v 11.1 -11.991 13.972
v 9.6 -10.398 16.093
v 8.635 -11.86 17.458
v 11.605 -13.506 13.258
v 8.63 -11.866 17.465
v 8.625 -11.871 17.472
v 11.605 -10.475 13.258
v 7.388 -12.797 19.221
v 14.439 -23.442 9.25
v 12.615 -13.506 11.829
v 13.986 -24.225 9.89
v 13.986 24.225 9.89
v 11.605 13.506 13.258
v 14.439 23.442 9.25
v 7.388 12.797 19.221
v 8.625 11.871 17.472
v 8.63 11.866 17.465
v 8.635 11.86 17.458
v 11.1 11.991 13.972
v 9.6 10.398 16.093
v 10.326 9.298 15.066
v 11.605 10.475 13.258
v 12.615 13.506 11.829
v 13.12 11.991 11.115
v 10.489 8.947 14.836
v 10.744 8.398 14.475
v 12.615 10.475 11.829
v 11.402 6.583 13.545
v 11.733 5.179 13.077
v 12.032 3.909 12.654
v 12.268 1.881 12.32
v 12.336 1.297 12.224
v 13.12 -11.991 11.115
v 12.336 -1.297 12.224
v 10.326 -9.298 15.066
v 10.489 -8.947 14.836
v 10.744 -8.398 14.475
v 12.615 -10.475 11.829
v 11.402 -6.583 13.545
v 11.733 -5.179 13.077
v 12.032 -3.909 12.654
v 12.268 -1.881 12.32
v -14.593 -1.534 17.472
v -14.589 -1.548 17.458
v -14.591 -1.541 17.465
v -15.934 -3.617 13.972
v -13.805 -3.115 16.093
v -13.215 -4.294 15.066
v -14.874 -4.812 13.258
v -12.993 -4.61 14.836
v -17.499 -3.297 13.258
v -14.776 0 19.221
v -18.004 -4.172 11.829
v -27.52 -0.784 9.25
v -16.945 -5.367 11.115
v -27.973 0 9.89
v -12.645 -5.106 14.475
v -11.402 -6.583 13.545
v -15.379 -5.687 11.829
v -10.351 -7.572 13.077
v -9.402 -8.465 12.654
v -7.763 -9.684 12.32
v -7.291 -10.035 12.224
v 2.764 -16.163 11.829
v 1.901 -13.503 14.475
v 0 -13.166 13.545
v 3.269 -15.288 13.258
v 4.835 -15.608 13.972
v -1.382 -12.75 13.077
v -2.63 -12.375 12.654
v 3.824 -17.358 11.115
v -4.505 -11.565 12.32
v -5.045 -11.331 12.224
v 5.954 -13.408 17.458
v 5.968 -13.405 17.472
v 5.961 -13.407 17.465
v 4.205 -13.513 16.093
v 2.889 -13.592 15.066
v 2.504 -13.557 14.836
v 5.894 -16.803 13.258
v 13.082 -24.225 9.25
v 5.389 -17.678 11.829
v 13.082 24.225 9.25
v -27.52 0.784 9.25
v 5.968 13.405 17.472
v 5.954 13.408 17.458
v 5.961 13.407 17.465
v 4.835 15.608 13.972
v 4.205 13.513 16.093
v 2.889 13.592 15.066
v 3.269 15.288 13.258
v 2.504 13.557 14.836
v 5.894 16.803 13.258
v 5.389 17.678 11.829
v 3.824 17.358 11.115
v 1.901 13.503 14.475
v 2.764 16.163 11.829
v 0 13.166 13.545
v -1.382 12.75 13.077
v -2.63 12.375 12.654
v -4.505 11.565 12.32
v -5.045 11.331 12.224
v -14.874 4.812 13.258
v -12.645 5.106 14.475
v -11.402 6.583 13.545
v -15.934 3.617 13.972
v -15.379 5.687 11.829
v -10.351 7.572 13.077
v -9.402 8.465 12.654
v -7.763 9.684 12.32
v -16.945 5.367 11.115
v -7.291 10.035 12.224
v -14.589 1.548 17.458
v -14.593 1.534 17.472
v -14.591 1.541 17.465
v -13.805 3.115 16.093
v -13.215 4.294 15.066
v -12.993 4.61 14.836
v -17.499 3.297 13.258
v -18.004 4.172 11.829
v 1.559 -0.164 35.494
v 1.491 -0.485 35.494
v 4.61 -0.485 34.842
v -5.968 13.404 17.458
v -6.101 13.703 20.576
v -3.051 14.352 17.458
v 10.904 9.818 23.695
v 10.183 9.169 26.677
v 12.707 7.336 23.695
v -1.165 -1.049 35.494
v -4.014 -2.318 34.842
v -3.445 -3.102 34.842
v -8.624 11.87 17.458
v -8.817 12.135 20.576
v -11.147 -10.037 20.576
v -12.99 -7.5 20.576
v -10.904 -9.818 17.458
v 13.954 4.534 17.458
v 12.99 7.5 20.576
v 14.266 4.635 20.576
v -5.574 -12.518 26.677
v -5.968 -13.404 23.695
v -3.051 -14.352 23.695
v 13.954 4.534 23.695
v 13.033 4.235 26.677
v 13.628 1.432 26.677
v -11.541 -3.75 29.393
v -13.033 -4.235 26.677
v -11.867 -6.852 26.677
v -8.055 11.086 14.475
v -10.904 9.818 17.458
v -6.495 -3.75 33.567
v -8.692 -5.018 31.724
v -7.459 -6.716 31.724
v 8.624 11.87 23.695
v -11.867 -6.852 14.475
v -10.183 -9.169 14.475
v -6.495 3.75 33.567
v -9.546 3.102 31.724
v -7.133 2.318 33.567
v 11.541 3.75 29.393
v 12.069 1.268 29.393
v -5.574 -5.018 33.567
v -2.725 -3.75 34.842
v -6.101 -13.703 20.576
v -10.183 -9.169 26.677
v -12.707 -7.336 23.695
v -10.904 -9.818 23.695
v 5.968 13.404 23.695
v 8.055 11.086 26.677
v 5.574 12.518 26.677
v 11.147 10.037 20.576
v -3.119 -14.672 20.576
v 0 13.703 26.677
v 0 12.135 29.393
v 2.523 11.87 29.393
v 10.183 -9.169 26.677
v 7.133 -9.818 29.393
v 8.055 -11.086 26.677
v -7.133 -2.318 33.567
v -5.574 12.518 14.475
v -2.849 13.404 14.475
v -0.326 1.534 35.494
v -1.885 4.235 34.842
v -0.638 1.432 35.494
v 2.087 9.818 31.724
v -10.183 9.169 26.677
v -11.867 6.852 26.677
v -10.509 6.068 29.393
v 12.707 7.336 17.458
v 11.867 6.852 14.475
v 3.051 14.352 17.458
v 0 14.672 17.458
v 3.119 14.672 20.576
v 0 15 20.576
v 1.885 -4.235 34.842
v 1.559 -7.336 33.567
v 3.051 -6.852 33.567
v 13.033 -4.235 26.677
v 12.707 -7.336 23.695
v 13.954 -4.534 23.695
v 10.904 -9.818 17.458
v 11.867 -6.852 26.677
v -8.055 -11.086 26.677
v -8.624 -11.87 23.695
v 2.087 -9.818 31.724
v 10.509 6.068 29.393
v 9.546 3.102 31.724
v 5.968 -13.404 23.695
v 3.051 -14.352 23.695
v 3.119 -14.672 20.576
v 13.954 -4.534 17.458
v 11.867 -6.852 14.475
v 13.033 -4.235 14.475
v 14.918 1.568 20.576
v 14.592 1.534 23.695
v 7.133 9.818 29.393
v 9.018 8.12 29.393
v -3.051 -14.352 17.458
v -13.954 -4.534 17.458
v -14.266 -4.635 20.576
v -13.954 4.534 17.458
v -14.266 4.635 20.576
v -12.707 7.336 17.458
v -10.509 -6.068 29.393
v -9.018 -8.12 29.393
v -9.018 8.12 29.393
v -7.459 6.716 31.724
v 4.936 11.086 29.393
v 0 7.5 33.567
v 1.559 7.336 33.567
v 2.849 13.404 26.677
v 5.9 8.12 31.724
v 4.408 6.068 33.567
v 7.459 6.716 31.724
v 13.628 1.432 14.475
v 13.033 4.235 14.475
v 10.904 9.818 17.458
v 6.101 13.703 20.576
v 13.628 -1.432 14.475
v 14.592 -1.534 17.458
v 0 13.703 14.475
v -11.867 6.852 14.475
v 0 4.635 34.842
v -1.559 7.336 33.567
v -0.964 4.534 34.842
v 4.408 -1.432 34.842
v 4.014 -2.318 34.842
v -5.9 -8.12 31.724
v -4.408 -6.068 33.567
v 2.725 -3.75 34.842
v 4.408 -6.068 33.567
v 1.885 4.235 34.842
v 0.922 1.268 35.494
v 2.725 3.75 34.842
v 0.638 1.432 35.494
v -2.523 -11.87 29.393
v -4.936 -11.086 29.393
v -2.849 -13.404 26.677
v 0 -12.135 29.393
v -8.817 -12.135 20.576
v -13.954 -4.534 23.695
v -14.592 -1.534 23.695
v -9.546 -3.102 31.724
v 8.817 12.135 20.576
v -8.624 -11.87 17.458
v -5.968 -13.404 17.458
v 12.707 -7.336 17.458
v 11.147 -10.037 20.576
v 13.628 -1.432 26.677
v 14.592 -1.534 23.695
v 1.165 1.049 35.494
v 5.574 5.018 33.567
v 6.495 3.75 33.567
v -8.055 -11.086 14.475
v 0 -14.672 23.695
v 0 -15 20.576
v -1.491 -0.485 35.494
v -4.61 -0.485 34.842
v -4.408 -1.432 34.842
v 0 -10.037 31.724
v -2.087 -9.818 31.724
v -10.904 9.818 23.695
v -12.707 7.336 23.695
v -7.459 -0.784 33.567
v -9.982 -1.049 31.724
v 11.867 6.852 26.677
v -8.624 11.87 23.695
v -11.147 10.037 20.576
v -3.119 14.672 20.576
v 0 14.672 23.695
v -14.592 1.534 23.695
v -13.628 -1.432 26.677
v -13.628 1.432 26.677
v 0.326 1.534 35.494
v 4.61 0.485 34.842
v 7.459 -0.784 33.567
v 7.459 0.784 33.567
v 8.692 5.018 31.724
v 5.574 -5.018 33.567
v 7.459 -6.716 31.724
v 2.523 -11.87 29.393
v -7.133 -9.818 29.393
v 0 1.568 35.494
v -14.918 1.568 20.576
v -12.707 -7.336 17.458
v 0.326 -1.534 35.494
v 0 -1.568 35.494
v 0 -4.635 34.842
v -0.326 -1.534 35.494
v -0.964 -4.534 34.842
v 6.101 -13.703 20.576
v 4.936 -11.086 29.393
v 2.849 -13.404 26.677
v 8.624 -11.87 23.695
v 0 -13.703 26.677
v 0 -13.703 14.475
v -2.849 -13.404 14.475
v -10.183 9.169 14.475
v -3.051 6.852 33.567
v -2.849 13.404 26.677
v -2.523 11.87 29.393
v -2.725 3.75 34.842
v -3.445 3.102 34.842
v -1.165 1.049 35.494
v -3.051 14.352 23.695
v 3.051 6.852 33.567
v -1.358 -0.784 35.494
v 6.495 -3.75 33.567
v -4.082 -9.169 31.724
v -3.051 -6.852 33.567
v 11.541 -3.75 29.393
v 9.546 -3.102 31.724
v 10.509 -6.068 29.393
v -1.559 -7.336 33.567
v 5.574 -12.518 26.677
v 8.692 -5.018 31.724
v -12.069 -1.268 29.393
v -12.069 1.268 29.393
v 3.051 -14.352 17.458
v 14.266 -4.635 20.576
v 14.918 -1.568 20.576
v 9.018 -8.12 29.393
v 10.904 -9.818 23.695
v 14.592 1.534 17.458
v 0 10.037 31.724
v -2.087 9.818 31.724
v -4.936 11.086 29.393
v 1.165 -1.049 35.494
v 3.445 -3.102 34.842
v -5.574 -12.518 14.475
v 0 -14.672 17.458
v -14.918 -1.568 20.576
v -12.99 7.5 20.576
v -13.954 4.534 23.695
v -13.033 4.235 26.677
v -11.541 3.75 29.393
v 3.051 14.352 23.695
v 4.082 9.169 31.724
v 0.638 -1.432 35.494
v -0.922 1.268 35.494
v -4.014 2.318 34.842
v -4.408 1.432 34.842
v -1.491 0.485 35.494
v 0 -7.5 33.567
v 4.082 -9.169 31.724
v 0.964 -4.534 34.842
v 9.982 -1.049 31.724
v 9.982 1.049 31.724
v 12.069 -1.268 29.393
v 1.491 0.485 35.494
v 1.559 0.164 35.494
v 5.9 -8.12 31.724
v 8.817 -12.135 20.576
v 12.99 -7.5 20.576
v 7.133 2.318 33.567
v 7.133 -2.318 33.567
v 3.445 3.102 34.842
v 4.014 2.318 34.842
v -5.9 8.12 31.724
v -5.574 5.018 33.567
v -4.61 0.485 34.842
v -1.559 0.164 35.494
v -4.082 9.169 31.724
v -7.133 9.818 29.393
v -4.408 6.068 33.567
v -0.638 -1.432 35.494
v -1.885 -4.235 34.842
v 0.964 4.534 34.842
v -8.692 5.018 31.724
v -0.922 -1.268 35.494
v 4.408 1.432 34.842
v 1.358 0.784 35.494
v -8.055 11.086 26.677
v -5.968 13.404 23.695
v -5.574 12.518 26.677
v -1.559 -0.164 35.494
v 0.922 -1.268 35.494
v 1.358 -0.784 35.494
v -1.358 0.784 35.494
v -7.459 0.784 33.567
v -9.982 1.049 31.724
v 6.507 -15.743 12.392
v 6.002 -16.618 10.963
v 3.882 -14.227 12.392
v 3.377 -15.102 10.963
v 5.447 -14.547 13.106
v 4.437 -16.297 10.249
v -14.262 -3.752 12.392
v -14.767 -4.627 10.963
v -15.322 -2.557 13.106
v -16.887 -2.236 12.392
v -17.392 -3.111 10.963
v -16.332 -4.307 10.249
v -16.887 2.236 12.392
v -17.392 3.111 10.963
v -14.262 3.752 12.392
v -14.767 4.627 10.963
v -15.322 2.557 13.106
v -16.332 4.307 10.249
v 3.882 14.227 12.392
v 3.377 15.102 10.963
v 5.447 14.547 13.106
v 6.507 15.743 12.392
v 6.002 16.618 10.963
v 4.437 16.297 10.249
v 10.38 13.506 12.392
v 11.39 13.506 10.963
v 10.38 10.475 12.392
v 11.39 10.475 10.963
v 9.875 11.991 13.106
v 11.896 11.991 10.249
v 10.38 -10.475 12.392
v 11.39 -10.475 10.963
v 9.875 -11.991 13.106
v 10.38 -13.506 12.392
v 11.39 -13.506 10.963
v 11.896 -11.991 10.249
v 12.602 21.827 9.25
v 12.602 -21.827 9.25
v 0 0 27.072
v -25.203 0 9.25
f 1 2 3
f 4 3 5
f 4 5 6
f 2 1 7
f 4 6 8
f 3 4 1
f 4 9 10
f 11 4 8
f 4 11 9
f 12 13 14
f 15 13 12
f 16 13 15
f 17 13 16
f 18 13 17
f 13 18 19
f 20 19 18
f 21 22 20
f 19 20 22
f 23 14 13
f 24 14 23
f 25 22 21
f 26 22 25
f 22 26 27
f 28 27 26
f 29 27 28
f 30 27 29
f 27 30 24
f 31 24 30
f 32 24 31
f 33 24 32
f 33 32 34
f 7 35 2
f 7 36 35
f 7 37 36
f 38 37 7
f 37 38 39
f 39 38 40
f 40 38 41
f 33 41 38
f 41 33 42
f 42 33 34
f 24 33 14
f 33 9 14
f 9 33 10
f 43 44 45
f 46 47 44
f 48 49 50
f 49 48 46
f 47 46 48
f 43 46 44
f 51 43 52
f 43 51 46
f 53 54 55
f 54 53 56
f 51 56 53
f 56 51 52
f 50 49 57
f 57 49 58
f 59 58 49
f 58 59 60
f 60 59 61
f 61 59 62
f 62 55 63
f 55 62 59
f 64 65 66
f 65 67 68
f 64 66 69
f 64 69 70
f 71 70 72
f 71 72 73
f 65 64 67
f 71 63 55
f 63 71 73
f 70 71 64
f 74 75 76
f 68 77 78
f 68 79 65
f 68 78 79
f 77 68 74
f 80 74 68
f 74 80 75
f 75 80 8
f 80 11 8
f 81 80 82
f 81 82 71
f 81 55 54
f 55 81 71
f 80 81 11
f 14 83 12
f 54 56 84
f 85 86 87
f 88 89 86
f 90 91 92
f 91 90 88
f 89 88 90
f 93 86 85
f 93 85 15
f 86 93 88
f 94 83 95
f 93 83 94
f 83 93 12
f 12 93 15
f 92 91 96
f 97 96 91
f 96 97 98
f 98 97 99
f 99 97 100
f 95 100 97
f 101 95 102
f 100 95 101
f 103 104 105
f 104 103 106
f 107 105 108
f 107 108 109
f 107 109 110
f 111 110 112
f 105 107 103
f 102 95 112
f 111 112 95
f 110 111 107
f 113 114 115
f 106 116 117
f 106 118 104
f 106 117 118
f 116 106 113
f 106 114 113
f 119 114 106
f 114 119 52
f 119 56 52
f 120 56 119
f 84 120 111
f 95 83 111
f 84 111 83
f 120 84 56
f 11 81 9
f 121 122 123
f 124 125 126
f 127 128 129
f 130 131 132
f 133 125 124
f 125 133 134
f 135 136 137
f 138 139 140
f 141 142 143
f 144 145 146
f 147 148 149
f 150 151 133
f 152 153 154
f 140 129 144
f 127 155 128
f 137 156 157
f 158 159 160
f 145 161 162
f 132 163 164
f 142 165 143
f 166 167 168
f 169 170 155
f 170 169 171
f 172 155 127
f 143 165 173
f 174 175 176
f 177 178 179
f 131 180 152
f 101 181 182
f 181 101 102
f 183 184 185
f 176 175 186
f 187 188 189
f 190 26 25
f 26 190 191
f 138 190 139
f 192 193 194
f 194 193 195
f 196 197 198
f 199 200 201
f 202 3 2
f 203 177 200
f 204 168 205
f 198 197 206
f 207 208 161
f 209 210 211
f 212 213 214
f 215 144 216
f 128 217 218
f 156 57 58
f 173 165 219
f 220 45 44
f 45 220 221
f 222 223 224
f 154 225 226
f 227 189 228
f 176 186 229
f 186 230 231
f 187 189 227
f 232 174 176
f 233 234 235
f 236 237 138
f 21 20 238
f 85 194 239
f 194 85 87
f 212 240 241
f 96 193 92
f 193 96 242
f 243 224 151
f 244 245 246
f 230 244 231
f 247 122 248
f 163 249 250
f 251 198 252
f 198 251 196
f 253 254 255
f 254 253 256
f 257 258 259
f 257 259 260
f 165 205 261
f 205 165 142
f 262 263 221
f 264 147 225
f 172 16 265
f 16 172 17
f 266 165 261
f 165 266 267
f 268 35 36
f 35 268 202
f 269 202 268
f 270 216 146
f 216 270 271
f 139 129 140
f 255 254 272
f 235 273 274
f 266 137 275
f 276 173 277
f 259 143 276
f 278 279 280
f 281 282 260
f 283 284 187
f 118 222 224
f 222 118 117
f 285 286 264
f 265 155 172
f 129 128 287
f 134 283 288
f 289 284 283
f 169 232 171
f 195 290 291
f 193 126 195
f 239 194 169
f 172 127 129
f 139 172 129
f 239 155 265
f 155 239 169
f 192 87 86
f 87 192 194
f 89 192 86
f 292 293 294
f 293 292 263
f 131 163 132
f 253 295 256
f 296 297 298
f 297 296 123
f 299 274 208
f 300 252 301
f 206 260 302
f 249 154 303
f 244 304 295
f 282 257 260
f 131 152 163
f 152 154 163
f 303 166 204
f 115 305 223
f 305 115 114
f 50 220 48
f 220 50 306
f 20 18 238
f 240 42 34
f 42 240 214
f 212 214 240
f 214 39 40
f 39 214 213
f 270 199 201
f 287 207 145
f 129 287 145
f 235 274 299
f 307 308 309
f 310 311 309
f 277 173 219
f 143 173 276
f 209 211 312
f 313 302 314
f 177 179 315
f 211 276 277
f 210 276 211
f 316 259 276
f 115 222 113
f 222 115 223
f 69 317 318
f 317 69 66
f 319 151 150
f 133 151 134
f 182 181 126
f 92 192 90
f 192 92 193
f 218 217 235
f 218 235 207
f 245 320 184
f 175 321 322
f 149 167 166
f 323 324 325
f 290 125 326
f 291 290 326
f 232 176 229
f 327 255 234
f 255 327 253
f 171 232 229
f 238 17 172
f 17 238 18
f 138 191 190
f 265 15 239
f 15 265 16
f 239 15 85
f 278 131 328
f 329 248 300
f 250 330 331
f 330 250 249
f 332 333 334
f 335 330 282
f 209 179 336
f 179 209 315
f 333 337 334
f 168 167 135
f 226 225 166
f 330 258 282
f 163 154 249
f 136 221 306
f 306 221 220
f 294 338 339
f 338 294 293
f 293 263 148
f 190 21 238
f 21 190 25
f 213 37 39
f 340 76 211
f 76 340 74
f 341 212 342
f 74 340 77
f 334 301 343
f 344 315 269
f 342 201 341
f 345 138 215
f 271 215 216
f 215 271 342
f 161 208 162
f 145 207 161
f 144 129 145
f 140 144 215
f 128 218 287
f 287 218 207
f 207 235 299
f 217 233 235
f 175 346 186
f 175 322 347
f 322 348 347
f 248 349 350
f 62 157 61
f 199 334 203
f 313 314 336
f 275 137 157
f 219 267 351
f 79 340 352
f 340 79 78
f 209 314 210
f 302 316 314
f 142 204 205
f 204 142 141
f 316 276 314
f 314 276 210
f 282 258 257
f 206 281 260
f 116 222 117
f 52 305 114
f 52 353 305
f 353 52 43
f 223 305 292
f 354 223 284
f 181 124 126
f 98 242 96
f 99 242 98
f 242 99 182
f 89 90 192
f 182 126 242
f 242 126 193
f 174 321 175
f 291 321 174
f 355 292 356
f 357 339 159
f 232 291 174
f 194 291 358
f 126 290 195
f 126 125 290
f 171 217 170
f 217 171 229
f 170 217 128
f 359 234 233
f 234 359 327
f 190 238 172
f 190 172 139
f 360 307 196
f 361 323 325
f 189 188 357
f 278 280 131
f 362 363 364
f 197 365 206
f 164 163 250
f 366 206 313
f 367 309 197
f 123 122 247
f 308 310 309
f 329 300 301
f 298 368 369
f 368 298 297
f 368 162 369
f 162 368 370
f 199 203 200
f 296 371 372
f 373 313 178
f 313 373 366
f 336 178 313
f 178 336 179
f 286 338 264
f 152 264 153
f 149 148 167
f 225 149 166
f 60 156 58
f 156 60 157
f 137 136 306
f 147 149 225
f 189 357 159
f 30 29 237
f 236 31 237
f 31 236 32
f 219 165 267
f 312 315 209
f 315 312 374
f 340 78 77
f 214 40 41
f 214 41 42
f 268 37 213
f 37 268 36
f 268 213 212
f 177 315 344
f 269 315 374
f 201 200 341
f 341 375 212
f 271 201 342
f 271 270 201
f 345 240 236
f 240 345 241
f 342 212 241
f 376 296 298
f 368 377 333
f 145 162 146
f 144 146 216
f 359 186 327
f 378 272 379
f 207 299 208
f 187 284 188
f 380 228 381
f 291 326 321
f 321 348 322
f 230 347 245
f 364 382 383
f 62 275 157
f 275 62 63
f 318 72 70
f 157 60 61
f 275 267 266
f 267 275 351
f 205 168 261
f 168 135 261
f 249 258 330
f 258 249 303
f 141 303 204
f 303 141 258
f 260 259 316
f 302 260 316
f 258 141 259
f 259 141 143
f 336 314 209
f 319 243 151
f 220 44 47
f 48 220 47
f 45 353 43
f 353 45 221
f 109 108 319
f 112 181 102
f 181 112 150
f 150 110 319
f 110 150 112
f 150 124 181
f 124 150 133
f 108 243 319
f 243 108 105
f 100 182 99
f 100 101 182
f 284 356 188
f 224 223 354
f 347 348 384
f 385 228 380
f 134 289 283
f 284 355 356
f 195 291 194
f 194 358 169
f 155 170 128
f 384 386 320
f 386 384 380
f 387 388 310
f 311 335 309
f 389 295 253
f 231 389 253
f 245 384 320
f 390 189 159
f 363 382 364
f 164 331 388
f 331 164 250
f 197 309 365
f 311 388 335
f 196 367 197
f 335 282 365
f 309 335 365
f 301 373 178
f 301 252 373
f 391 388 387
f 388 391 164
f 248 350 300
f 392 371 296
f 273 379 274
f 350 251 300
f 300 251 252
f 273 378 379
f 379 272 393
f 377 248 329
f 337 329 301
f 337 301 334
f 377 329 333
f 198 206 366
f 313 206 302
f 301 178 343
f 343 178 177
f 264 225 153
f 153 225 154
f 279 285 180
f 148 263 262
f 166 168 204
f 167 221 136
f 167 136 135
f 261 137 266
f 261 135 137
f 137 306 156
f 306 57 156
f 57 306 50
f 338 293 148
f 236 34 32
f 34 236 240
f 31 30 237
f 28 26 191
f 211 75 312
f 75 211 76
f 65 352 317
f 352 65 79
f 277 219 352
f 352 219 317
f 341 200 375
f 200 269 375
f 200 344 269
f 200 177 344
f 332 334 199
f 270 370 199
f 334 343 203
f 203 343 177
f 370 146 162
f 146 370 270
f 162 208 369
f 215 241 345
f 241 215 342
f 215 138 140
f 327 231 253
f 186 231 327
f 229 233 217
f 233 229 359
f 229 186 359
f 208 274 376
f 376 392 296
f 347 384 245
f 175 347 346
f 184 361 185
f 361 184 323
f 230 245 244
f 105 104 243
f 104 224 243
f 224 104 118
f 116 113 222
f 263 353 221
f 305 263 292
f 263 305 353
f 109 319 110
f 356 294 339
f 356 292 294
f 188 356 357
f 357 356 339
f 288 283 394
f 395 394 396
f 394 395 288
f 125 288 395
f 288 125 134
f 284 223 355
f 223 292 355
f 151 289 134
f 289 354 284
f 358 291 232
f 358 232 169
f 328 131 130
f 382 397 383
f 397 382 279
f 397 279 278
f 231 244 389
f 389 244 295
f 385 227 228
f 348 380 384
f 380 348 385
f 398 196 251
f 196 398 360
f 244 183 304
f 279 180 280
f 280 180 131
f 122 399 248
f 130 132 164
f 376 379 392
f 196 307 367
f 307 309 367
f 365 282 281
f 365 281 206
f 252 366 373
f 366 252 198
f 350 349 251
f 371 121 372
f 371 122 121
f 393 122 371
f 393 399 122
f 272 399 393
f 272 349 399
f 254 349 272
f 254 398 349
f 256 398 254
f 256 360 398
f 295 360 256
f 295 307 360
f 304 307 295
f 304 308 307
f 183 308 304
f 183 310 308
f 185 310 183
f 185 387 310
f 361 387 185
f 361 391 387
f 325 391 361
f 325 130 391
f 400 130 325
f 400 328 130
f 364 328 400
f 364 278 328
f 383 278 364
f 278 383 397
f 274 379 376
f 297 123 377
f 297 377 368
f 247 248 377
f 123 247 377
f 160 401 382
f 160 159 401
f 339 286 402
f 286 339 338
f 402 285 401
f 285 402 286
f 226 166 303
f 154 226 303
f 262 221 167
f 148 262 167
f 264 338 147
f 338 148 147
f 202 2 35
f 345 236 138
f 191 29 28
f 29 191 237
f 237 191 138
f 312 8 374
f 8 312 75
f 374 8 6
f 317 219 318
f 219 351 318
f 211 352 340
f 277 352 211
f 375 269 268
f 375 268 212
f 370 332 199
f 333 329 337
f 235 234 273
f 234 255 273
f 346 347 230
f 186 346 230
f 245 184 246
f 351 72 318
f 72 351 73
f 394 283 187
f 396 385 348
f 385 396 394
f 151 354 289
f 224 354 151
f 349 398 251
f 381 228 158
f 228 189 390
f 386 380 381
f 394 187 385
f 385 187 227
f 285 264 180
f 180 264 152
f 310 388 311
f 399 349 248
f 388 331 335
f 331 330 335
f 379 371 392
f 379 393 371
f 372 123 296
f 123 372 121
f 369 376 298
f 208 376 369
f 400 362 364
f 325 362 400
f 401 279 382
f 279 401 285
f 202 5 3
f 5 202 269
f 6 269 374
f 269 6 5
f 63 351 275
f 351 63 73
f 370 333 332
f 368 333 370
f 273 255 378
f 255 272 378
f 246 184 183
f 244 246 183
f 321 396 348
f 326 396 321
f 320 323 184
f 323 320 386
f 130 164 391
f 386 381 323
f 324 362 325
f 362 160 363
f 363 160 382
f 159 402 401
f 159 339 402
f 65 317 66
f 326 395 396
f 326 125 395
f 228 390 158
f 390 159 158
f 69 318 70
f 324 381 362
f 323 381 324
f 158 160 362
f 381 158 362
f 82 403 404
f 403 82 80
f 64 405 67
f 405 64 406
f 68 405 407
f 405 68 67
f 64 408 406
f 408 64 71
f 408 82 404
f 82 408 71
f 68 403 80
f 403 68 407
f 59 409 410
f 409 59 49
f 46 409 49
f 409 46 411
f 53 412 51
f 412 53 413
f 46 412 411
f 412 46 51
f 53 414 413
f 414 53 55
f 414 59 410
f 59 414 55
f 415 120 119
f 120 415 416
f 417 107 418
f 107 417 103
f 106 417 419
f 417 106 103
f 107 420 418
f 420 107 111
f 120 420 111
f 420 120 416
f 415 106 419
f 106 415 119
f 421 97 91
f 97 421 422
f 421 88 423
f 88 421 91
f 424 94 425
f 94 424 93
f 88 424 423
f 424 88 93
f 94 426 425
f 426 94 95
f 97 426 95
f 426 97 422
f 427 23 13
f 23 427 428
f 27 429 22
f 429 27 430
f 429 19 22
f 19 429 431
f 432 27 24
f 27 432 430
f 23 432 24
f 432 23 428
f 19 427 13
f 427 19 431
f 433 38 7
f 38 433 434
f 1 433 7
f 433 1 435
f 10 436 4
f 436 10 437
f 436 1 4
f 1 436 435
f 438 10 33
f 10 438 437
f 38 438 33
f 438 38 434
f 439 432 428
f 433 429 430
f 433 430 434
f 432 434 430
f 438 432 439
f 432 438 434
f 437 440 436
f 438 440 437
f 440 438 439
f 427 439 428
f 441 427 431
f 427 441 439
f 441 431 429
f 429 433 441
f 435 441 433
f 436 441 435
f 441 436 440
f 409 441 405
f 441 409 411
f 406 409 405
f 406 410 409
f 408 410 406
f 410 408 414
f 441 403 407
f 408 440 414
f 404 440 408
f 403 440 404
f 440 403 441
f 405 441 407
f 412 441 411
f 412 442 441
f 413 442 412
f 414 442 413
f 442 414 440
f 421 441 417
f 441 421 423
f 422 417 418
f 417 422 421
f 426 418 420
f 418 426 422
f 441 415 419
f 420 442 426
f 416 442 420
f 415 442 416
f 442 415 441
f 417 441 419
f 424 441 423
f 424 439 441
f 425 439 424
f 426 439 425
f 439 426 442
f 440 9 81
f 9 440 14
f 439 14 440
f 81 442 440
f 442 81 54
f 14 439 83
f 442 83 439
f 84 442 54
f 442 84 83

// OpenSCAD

r = 15;    // [ 10 : 40 ] 
t = 1.5;	  // [ 0.5 : 3.0 ]
s = 3.5;   // [ 0.0 : 6.0 ]
so = 0.00; // [ 0.0 : 0.2 ]
m = 0.85; // [ 0.7 : 1.0 ]
c = r/sin(45)/0.725+s+t;

echo( c );

intersection()
{
rotate( [ 45, -asin( 1 / sqrt( 3 ) ), 0 ] )
difference()
{
	union()
	{
		cube( [ c, c, c ], center = true );
		translate( [ 1, 1, 1 ]*(c/2+r/2-r*m) )
			rotate( [ -asin( 1 / sqrt( 3 ) ), 45, 0 ] )
		//	rotate( [ 180, 0, 90 ] )
		//	cylinder( r1 = r, r2 = 0, h = r*2, $fn = 3 );
			sphere( r = r, center = true );

	}

		rotate( [ 0, 0, 0 ] )
			translate( [ 0, 0, 1 ] * c/2 ) rotate( [ 0, 0, 45 ] )
				translate( [ 1,0, 0 ] * (t+s*0.5) )
					for ( a = [ -1, +1 ] ) translate( (a+so)*[0,1,0] * c/2*0.7 )
					cylinder( r = s/2, h = c, center = true );
		rotate( [ 270, 0, 0 ] )
			translate( [ 0, 0, 1 ] * c/2 ) rotate( [ 0, 0, 270+45 ] )
				translate( [ 1,0, 0 ] * (t+s*0.5) )   
					for ( a = [ -1, +1 ] ) translate( (a+so)*[0,1,0] * c/2*0.7 )				cylinder( r = s/2, h = c, center = true );
		rotate( [ 0, 90, 0 ] )
			translate( [ 0, 0, 1 ] * c/2 ) rotate( [ 0, 0, 90+45 ] )
				translate( [ 1,0, 0 ] * (t+s*0.5) )   
					for ( a = [ -1, +1 ] ) translate( (a+so)*[0,1,0] * c/2*0.7 )					cylinder( r = s/2, h = c, center = true );

	cube( [ c-t*2, c-t*2, c-t*2 ], center = true );
}
translate( [ 0, 0, c*0.27+100 ] ) cube( 200, center = true );
}

/*
difference()
{
	union()
	{
		translate( [ 0, 0, h ] )
			sphere( r = r, center = true );
		translate( [ 0, 0, h/2 ] )
			cylinder( r1 = r2, r2 = 0, h = h, center = true, $fn = 3 );
	}

	translate( [ 0, 0, h/2-d*sqrt(2) ] )
		cylinder( r1 = r2, r2 = 0, h = h, center = true, $fn = 3 );

	for ( a = [ 0, 120, 240 ] ) rotate( a+60, [ 0, 0, 1 ] )
		translate( [ r2*cos(60), 0, 0 ] )
			rotate( [ 0, 60, 0 ] )
				translate( [ -1.25*s, 0, 0 ] )
			cylinder( r = s/2, h = d*3, center = true );
}
*/

/*
//rotate( [ 45, 0, 0 ] ) rotate( 30, [ 0, 1, -1 ] )
{color( "red" ) cube( [ 50, 0.1, 0.1 ], center = true );
color( "green" ) cube( [ 0.1, 50, 0.1 ], center = true );
color( "blue" ) cube( [ 0.1, 0.1, 50 ], center = true );
}
//translate( [ 3, 0, 0 ] )
//rotate( [ 45, 0, 0 ] ) rotate( 33, [ 0, 1, -1 ] )
//translate( [ 4, -5, -5 ] )
color( "snow" ) cube( 20, center = true );
*/
